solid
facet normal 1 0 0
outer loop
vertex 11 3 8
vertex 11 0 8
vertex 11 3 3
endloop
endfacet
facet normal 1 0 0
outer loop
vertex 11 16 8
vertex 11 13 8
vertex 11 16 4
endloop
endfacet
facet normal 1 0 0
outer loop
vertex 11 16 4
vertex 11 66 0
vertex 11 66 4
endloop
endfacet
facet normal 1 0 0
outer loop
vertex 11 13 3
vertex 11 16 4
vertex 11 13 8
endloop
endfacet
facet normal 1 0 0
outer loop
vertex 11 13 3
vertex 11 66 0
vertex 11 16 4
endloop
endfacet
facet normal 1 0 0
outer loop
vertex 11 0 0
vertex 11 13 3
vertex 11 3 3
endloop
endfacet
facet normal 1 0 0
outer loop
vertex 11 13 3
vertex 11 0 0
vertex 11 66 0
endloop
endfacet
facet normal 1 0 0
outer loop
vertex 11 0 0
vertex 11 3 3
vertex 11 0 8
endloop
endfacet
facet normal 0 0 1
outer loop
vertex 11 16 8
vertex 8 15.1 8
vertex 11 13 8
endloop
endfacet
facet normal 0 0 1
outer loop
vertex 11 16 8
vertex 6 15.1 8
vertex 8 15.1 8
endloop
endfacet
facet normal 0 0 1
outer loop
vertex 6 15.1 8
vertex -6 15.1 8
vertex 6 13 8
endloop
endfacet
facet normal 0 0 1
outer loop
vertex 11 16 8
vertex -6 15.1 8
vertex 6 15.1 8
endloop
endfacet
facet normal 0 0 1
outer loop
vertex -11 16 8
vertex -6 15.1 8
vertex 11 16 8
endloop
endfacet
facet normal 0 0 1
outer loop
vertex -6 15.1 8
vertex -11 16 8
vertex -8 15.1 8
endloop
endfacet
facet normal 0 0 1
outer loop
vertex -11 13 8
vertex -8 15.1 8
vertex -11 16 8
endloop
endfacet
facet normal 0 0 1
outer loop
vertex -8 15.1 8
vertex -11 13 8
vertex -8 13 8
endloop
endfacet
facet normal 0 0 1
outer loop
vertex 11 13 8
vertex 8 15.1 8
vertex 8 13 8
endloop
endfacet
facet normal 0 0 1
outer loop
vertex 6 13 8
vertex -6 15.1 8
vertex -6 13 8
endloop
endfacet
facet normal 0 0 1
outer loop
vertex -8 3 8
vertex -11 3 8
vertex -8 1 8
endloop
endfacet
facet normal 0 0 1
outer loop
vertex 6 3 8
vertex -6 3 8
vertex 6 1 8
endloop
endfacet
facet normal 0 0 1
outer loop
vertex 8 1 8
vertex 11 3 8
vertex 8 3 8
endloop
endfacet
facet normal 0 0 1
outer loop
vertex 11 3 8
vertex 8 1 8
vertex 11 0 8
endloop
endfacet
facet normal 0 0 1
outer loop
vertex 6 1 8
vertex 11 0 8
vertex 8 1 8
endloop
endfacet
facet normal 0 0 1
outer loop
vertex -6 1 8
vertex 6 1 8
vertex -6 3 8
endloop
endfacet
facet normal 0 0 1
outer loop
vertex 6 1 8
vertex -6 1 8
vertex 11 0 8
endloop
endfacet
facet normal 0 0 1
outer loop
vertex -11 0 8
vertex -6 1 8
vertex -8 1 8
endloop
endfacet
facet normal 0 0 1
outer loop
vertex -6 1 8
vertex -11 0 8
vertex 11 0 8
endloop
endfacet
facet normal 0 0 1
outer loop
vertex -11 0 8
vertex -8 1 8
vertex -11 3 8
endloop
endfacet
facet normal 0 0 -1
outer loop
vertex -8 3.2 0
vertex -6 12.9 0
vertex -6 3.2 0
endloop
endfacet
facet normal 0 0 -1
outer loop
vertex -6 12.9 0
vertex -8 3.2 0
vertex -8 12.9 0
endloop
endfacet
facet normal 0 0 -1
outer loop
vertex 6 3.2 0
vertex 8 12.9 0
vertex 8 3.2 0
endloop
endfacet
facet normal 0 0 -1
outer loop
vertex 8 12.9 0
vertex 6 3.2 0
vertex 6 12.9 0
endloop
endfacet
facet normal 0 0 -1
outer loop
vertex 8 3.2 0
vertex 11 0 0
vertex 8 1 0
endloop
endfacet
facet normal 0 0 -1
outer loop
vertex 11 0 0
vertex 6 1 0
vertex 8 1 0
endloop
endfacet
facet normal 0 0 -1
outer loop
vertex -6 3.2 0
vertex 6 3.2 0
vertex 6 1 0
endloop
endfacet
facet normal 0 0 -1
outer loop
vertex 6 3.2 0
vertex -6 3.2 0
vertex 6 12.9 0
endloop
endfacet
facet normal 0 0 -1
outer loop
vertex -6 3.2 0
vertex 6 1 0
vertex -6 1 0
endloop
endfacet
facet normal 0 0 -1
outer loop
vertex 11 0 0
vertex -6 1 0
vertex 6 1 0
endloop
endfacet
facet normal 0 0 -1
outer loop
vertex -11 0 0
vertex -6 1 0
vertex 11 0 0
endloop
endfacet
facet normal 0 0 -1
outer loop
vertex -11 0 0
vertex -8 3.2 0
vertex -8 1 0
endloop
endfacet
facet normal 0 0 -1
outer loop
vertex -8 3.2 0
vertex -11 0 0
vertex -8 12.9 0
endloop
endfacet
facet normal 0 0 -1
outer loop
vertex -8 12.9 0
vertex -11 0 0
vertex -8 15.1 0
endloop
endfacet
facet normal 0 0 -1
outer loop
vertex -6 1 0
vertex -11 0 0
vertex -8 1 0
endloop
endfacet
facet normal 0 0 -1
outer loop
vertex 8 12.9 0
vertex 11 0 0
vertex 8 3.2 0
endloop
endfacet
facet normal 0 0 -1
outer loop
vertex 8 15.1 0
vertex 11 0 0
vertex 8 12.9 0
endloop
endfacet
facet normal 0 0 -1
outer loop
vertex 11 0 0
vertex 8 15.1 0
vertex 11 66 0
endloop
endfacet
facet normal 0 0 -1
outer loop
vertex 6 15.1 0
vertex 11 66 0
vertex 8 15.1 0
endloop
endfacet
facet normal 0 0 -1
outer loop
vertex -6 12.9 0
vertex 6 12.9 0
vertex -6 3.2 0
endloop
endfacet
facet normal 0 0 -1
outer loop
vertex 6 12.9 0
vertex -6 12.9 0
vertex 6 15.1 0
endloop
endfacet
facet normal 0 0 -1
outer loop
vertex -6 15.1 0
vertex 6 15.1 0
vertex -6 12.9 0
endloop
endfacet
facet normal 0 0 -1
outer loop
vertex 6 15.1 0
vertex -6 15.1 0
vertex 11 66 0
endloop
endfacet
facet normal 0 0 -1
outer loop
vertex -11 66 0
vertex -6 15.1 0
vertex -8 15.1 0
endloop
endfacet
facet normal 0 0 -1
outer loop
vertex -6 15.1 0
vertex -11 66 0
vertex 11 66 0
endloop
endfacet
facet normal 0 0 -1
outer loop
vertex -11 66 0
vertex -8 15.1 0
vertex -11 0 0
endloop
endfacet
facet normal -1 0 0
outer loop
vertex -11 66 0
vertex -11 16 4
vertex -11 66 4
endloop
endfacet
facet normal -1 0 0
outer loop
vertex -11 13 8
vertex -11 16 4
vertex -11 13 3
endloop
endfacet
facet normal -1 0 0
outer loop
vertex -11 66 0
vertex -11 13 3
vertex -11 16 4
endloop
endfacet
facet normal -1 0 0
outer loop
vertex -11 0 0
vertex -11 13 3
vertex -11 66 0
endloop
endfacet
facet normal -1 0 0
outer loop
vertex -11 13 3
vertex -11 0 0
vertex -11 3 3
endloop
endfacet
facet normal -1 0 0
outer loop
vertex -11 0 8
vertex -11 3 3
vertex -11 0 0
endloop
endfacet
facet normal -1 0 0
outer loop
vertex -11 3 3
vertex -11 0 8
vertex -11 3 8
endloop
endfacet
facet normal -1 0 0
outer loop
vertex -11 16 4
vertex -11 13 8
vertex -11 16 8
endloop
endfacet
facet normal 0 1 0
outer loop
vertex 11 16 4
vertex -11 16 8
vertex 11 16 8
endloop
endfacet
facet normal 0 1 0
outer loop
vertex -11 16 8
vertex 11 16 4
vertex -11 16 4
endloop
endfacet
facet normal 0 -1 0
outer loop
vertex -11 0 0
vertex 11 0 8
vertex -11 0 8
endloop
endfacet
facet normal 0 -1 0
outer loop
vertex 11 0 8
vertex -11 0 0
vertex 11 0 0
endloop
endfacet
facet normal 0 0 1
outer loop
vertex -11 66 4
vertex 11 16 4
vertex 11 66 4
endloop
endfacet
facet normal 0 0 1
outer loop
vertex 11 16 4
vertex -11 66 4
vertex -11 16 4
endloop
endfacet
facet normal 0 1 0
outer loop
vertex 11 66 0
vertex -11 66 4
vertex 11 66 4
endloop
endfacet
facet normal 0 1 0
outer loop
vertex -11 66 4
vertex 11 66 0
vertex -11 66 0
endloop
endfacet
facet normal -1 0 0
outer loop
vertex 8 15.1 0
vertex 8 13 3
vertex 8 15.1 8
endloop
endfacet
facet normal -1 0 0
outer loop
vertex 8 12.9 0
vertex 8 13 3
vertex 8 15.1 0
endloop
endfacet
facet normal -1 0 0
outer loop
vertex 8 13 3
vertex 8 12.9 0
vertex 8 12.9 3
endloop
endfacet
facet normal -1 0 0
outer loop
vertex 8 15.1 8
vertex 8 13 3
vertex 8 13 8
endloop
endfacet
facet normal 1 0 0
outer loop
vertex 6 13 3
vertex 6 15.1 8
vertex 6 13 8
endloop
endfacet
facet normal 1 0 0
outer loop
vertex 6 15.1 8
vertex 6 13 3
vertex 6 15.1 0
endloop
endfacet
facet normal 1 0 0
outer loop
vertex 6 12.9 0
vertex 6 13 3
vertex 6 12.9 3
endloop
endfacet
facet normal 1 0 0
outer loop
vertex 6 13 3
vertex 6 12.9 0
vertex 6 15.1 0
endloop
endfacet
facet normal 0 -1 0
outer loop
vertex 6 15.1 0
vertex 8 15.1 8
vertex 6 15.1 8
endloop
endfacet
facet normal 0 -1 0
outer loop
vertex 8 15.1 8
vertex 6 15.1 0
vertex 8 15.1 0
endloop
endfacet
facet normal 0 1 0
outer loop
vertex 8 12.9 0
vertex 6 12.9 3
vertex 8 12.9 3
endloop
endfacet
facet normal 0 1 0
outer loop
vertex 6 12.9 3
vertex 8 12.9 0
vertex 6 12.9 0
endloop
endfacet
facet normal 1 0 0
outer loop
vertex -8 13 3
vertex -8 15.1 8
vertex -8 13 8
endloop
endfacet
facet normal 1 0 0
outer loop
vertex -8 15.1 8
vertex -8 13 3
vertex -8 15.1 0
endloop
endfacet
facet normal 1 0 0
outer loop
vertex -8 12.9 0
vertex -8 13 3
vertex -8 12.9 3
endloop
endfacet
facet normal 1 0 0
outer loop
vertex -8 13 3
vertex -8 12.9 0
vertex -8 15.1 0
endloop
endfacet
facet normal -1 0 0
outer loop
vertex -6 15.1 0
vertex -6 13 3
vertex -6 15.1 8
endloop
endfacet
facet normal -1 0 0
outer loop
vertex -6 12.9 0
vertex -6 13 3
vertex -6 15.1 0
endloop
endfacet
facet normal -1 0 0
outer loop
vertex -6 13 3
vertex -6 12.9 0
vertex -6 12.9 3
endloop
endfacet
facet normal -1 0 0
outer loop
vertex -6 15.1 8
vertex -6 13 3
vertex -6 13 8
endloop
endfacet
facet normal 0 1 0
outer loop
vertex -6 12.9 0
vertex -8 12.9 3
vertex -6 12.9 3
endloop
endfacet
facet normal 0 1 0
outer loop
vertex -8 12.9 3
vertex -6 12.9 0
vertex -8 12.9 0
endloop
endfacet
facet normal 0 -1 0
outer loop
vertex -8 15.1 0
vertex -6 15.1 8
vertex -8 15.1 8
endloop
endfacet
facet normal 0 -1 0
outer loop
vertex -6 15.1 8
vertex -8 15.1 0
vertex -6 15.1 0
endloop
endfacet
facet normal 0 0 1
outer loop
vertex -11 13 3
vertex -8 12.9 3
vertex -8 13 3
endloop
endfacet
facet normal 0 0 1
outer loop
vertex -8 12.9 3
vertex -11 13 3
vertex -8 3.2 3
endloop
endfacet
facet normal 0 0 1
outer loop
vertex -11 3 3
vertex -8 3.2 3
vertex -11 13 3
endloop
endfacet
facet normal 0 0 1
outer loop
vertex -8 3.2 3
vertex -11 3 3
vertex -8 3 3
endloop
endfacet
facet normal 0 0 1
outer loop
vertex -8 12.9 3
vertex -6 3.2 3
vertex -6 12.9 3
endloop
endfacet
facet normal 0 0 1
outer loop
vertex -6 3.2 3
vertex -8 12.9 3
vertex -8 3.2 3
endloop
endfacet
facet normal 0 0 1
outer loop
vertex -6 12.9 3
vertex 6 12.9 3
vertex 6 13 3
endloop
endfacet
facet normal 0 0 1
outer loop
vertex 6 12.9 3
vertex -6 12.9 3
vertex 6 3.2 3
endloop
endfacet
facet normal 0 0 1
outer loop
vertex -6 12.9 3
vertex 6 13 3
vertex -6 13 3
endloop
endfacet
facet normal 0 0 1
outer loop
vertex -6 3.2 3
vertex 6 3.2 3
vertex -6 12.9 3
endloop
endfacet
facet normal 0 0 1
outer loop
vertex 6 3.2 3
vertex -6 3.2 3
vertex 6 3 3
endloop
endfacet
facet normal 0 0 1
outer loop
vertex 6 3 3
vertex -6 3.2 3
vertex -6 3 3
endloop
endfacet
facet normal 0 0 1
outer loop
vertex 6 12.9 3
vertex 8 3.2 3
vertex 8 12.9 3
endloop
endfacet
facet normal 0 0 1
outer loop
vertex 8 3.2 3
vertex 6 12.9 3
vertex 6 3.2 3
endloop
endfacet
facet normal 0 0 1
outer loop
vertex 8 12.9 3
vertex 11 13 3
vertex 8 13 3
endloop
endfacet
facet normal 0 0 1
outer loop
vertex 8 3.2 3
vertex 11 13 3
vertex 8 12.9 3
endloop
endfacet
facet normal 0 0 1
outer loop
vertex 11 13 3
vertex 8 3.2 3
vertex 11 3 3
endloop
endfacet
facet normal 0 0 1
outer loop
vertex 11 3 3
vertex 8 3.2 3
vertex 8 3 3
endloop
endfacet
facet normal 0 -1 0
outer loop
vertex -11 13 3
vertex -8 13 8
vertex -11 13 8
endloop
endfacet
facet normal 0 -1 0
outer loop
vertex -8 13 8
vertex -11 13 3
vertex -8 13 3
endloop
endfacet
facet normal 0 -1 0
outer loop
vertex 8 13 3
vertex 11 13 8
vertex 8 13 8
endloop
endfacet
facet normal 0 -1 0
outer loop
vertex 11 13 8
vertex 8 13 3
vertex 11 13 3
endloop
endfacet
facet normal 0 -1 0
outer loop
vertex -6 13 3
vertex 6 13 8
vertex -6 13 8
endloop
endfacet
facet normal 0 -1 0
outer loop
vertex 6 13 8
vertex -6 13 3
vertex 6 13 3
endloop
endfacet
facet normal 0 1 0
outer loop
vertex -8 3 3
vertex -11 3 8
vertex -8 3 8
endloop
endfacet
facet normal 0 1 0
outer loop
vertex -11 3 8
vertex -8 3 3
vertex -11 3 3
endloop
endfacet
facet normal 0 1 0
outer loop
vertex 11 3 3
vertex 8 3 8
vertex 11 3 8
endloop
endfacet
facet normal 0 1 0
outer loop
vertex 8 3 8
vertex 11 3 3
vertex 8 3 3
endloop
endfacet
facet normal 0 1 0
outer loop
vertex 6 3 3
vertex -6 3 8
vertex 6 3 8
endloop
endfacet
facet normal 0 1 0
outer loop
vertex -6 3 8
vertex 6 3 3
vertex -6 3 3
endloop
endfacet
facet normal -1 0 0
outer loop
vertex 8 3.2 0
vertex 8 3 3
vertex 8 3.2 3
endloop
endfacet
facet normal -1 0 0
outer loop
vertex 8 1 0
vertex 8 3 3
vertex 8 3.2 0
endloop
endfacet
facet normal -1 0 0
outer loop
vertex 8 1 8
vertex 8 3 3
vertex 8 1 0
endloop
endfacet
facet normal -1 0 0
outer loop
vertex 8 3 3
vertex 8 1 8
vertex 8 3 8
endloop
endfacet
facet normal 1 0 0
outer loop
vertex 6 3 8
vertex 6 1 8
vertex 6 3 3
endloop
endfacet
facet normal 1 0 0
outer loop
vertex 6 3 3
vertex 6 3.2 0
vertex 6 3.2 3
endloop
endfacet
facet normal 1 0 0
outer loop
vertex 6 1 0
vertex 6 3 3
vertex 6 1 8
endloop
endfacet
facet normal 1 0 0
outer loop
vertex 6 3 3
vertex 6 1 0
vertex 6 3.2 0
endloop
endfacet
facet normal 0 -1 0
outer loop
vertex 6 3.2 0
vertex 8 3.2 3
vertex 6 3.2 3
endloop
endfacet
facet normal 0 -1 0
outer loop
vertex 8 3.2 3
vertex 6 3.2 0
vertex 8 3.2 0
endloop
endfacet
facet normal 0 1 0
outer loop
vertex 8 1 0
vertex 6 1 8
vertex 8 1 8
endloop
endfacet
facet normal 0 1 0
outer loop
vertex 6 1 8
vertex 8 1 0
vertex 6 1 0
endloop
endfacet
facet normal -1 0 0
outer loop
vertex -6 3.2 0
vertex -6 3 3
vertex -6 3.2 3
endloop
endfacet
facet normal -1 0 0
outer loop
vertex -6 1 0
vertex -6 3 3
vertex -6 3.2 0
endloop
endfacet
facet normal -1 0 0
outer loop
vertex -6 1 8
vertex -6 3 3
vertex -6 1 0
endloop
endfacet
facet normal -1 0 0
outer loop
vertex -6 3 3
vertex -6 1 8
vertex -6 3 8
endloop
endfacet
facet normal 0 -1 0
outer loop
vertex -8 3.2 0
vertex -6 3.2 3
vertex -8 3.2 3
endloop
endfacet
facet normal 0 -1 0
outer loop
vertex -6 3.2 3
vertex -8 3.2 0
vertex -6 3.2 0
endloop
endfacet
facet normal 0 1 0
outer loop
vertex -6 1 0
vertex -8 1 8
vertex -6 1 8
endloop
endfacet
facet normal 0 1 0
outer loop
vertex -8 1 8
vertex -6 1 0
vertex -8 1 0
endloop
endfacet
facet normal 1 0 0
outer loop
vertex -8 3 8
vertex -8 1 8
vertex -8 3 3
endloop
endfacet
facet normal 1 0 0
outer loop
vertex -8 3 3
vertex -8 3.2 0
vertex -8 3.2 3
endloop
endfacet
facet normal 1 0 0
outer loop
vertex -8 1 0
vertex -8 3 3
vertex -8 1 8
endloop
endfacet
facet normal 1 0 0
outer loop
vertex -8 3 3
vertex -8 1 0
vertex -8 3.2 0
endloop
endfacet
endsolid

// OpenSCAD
boom = 10;
boomL = 30;

connectW = 22;
connectD = 16;
connectH = 8;

transmitW = 22;
transmitD = 50;
transmitH = 4;

module transmit() {
	difference(){
		union(){
			translate([-connectW/2,0,0]){ 
				cube([connectW,connectD,connectH]);
			}
			translate([-transmitW/2,connectD,0]){
				cube([transmitW,transmitD,transmitH]);
			}
		}
		translate([-boomL/2,3,3]){
			#cube([boomL,boom,boom]);
		}
		
translate([0,boom+1.9,0]){
					translate([6,1,-1]){
			cube([2,2.2,10]);
		}
		mirror([1,0,0]){
			translate([6,1,-1]){
				cube([2,2.2,10]);
			}
		}
}
		
		translate([6,1,-1]){
			cube([2,2.2,10]);
		}
		mirror([1,0,0]){
			translate([6,1,-1]){
				cube([2,2.2,10]);
			}
		}
	}
}

transmit();
